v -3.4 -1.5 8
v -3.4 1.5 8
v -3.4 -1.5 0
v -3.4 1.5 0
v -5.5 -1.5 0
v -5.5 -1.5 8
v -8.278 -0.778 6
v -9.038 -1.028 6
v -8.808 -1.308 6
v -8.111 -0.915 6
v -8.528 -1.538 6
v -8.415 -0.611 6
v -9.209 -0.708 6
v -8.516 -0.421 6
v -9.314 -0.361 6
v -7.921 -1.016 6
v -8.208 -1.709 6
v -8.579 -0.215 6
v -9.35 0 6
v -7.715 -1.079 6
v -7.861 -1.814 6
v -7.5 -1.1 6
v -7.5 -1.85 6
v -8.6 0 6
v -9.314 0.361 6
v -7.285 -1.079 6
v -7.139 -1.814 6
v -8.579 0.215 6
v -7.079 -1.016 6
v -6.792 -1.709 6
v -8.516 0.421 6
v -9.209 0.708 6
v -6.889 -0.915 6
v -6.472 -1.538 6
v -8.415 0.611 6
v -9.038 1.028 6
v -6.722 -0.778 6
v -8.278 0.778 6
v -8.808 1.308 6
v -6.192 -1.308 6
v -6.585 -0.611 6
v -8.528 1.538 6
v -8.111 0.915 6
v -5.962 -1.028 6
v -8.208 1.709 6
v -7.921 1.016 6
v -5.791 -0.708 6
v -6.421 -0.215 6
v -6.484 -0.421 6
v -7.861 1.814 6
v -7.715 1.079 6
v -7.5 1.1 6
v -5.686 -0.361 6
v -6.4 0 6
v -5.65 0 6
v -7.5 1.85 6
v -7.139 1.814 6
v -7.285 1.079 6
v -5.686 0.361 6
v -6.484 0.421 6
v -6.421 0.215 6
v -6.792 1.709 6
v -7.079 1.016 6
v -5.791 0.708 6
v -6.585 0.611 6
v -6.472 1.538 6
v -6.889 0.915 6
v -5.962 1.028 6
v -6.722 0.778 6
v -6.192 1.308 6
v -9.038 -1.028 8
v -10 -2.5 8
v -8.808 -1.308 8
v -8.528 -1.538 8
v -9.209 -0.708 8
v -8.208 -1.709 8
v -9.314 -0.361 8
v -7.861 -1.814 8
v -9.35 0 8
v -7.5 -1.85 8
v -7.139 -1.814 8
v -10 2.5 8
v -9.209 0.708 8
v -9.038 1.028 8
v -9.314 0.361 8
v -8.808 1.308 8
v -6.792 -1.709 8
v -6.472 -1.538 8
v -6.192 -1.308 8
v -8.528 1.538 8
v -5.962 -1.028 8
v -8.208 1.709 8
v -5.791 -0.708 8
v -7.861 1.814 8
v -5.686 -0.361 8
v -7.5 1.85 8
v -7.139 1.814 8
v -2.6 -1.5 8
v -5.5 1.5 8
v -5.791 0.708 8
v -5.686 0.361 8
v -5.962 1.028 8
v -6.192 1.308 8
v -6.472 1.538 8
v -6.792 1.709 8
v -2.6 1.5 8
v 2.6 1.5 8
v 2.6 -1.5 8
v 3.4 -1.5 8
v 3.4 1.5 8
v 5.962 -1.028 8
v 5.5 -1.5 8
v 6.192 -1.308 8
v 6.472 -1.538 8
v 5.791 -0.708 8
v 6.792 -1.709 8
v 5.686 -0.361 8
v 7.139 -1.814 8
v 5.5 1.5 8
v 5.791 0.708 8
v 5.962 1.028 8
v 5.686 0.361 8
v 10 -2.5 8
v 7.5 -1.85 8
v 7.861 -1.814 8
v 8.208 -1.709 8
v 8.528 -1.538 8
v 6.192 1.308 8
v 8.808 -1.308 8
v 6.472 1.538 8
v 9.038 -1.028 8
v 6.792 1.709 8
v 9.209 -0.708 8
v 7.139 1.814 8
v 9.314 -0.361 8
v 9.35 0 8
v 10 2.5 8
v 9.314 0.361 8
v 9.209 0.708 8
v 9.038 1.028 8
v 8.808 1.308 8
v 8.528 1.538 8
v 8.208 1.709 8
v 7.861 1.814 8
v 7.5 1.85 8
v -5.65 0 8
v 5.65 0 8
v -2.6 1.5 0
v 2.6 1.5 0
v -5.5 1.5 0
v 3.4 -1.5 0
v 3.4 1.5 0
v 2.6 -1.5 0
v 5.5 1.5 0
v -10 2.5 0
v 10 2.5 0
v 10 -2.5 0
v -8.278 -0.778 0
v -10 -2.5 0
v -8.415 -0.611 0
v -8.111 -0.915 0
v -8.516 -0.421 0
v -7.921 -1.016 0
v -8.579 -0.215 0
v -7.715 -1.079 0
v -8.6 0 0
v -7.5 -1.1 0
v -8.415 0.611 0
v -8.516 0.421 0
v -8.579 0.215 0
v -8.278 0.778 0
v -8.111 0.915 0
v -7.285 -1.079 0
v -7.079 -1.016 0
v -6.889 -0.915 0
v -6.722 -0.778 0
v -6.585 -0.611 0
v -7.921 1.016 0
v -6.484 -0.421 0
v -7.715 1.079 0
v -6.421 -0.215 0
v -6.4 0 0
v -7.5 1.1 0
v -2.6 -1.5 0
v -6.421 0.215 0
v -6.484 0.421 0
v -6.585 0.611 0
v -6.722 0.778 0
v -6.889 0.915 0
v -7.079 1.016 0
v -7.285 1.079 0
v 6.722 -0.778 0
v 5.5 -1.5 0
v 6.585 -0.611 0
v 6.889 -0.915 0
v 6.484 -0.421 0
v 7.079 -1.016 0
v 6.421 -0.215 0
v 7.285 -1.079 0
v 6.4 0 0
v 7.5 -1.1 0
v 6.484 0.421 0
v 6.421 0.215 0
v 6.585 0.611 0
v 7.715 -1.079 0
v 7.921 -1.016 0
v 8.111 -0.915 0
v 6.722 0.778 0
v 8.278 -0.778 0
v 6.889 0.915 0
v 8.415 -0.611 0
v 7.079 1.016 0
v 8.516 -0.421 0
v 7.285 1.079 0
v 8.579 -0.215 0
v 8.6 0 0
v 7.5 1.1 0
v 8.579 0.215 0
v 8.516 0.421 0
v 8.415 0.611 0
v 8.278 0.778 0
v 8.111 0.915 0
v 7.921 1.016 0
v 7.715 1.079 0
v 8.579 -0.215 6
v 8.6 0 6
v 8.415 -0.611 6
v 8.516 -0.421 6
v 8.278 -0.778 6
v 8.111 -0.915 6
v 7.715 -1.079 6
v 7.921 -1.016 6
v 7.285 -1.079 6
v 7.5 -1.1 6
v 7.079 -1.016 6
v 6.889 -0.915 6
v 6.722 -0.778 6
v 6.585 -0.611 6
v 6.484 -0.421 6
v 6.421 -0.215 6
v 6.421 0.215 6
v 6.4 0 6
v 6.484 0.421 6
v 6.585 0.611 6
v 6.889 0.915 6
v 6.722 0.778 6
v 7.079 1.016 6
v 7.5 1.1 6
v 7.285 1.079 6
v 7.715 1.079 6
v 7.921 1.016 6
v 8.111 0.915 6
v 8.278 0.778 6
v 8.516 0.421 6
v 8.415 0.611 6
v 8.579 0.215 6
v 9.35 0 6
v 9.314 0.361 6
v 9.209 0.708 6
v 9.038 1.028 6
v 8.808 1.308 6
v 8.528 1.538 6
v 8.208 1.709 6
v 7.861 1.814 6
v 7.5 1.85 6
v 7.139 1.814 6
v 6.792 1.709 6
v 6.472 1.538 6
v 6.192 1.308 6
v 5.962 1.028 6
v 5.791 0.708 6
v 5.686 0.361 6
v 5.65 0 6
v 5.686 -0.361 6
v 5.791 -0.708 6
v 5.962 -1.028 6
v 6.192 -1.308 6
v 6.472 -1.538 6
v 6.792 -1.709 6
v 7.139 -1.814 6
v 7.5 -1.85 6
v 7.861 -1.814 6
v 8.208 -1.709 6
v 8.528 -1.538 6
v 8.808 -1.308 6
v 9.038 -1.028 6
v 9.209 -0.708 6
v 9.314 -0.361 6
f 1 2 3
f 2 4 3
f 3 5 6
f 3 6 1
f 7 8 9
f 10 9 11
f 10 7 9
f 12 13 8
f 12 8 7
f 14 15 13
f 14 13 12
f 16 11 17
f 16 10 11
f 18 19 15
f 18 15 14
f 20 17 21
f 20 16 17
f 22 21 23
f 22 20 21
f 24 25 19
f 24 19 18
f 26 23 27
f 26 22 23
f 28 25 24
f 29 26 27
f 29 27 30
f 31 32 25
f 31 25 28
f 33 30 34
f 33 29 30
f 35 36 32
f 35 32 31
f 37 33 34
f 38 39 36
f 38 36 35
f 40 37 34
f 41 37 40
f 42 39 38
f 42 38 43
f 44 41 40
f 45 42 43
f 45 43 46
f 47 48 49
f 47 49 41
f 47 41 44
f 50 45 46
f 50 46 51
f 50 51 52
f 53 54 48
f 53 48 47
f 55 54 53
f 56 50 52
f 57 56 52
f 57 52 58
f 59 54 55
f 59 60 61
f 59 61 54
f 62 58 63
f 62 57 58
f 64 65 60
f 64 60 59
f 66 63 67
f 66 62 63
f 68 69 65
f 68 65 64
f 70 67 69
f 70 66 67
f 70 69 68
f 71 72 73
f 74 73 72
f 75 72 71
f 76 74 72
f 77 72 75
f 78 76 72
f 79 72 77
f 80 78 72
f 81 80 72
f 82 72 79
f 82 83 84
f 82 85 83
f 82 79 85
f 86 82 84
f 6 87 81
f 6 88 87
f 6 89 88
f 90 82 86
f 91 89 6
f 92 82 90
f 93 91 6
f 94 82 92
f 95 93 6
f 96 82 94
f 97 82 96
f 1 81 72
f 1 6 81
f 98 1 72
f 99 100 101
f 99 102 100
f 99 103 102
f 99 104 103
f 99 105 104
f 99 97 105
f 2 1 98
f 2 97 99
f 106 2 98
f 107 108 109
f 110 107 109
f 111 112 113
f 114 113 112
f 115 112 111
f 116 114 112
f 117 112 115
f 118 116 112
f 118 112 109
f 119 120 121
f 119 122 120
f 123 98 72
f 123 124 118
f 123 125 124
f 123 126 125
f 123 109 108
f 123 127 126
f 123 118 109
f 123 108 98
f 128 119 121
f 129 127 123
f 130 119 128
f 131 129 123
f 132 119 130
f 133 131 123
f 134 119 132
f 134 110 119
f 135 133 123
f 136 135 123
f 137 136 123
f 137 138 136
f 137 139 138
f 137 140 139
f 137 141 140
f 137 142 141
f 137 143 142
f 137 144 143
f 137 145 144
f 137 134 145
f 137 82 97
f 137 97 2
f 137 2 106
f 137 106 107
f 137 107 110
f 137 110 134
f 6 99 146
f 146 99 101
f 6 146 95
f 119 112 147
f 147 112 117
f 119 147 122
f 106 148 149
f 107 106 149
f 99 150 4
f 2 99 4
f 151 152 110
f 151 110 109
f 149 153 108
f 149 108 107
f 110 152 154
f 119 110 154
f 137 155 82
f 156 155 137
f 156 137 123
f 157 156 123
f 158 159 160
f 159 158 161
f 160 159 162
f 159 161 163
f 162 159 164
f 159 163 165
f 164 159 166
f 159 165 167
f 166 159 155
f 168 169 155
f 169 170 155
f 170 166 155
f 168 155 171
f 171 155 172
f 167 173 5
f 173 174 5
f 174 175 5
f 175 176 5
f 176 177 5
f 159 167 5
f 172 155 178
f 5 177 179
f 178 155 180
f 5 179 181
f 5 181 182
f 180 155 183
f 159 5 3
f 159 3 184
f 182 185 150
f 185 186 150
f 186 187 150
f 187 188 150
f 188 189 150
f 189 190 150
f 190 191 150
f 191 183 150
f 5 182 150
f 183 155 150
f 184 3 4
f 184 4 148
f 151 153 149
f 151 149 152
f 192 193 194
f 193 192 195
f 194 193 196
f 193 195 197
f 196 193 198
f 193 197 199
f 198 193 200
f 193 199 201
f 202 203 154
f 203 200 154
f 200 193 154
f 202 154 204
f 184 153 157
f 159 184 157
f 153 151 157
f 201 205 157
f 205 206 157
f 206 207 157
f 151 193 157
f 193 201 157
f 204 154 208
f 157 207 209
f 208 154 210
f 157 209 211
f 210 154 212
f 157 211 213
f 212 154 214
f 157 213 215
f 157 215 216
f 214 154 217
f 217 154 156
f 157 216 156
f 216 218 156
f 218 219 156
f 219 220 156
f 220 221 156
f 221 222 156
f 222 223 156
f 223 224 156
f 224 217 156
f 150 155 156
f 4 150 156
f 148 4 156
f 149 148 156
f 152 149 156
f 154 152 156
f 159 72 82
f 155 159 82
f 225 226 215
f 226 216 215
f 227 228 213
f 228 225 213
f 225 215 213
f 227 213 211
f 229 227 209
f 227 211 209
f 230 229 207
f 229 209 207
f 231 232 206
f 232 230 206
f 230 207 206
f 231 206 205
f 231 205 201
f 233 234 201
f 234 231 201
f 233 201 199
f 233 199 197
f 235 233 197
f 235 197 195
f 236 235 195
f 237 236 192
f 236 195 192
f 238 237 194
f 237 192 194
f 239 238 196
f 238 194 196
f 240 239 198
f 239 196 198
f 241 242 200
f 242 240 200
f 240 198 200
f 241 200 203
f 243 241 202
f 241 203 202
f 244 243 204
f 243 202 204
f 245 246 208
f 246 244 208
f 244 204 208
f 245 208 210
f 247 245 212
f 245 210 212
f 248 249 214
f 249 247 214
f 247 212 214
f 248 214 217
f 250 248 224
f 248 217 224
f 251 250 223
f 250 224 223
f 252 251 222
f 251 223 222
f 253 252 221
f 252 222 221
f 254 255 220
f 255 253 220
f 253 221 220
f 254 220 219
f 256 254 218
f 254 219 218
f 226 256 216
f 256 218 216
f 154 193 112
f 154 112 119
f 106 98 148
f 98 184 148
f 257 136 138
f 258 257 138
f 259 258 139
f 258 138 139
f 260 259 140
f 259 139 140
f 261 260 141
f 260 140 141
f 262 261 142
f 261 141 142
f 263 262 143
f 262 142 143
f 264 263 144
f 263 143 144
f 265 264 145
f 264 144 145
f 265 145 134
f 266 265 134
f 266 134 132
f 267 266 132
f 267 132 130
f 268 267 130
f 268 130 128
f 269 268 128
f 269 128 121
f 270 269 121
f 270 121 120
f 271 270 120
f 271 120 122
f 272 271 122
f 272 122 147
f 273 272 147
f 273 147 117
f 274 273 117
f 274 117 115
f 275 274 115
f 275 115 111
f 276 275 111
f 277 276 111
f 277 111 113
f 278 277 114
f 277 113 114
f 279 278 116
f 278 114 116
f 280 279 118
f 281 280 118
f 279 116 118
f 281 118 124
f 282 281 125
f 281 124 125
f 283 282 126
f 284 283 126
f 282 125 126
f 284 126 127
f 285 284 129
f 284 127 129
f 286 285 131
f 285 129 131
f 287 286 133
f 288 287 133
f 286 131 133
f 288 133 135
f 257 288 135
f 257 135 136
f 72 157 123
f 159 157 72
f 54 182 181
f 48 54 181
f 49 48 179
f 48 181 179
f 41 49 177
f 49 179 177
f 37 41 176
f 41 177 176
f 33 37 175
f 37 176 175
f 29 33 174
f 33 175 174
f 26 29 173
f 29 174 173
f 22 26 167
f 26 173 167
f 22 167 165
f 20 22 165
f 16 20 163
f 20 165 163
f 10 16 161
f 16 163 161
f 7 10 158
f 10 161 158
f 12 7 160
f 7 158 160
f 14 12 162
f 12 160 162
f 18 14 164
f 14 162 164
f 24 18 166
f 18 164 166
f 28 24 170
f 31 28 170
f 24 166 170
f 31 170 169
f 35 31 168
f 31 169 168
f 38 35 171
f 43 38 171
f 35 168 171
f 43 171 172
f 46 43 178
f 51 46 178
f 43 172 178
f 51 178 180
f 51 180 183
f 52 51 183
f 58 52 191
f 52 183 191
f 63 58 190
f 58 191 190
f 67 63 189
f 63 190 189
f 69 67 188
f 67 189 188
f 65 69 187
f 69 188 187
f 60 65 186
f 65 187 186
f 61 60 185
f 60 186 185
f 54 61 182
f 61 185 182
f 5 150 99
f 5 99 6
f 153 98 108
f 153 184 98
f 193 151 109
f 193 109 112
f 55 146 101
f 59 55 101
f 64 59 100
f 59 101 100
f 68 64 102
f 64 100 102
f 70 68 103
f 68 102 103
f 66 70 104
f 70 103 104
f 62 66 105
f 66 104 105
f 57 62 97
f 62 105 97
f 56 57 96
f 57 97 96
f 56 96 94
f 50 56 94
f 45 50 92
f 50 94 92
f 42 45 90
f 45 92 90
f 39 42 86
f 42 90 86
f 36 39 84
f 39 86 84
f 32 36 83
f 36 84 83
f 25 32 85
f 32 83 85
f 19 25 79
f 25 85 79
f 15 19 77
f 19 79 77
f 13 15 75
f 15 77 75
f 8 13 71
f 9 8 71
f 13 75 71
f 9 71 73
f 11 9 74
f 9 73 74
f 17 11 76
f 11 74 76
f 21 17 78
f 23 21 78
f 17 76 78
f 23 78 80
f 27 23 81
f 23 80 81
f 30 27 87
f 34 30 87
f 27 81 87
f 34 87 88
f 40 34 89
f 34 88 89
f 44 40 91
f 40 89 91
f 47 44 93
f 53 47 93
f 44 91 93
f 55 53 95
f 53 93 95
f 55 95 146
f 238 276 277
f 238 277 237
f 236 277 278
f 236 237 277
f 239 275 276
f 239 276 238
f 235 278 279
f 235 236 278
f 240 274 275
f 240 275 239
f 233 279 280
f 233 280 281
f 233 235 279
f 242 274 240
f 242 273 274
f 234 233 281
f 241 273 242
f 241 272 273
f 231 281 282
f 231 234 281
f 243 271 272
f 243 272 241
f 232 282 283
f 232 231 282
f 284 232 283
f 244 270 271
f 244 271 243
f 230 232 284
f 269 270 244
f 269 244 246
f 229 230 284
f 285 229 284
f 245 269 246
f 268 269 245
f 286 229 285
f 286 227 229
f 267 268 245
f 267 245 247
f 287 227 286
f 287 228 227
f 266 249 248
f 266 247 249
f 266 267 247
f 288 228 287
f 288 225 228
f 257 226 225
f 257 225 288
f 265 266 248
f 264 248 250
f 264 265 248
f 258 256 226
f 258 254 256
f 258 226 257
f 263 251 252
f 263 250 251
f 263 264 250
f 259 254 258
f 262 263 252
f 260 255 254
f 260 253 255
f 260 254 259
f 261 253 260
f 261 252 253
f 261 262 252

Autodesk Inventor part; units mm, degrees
ref_plane "YZ Plane" through (0, 0, 0) normal (1, 0, 0) x (0, 1, 0)
ref_plane "XZ Plane" through (0, 0, 0) normal (0, 1, 0) x (-1, 0, 0)
ref_plane "XY Plane" through (0, 0, 0) normal (0, 0, 1) x (1, 0, 0)
sketch "スケッチ1" plane through (0, 0, 0) normal (0, 0, 1) x (1, 0, 0)
  line L0 (10, -2.5) -> (-10, -2.5)
  line L1 (-10, -2.5) -> (-10, 2.5)
  line L2 (-10, 2.5) -> (10, 2.5)
  line L3 (10, 2.5) -> (10, -2.5)
  line L4 (10, -2.5) -> (-10, 2.5) construction
  line L5 (-10, -2.5) -> (10, 2.5) construction
  circle A0 centre (-7.5, 0) radius 1.1
  circle A1 centre (7.5, 0) radius 1.1
  line L6 (5.5, -2.5) -> (5.5, 2.5)
  line L7 (-5.5, 2.5) -> (-5.5, -2.5)
  line L8 (-5.5, -1.5) -> (5.5, -1.5)
  line L9 (-5.5, 1.5) -> (5.5, 1.5)
  line L10 (3, -1.5) -> (3, 1.5)
  line L11 (3, 1.5) -> (3.4, 1.5)
  line L12 (3.4, 1.5) -> (3.4, -1.5)
  line L13 (3, -1.5) -> (2.6, -1.5)
  line L14 (2.6, -1.5) -> (2.6, 1.5)
  line L15 (-3, -1.5) -> (-3, 1.5)
  line L16 (-3, 1.5) -> (-3.4, 1.5)
  line L17 (-3.4, 1.5) -> (-3.4, -1.5)
  line L18 (-3, -1.5) -> (-2.6, -1.5)
  line L19 (-2.6, -1.5) -> (-2.6, 1.5)
  point P0 (0, 0)
  dimension "d0" = 20
  dimension "d1" = 5
  dimension "d2" = 2.2
  dimension "d3" = 2.2
  dimension "d4" = 0.4
  dimension "d5" = 0.4
  dimension "d6" = 0.4
  dimension "d7" = 0.4
  dimension "d10" = 1
  dimension "d11" = 1
  dimension "d16" = 2.5
  dimension "d17" = 4.5
  dimension "d18" = 2.1
extrude "押し出し1" add sketch "スケッチ1" along normal blind 8 contours L0 L6 L2 L3 | L0 L7 L8 L6 | L0 L1 L2 L7 | L6 L9 L7 L2 | L8 L10 L9 L12 | L17 L9 L15 L8 | L8 L14 L9 L10 | L15 L9 L19 L8
sketch "スケッチ2" plane through (0, 0, 8) normal (0, 0, 1) x (1, 0, 0)
  circle A0 centre (-7.5, 0) radius 1.1 projected
  circle A1 centre (-7.5, 0) radius 1.85
  circle A2 centre (7.5, 0) radius 1.1 projected
  circle A3 centre (7.5, 0) radius 1.85
  point P0 (0, 0)
  dimension "d12" = 3.7
  dimension "d13" = 3.7
extrude "押し出し2" cut sketch "スケッチ2" against normal blind 2 contours A0 | A1 | A3
properties part number "griper_TPU" material "ゴム、シリコーン"
